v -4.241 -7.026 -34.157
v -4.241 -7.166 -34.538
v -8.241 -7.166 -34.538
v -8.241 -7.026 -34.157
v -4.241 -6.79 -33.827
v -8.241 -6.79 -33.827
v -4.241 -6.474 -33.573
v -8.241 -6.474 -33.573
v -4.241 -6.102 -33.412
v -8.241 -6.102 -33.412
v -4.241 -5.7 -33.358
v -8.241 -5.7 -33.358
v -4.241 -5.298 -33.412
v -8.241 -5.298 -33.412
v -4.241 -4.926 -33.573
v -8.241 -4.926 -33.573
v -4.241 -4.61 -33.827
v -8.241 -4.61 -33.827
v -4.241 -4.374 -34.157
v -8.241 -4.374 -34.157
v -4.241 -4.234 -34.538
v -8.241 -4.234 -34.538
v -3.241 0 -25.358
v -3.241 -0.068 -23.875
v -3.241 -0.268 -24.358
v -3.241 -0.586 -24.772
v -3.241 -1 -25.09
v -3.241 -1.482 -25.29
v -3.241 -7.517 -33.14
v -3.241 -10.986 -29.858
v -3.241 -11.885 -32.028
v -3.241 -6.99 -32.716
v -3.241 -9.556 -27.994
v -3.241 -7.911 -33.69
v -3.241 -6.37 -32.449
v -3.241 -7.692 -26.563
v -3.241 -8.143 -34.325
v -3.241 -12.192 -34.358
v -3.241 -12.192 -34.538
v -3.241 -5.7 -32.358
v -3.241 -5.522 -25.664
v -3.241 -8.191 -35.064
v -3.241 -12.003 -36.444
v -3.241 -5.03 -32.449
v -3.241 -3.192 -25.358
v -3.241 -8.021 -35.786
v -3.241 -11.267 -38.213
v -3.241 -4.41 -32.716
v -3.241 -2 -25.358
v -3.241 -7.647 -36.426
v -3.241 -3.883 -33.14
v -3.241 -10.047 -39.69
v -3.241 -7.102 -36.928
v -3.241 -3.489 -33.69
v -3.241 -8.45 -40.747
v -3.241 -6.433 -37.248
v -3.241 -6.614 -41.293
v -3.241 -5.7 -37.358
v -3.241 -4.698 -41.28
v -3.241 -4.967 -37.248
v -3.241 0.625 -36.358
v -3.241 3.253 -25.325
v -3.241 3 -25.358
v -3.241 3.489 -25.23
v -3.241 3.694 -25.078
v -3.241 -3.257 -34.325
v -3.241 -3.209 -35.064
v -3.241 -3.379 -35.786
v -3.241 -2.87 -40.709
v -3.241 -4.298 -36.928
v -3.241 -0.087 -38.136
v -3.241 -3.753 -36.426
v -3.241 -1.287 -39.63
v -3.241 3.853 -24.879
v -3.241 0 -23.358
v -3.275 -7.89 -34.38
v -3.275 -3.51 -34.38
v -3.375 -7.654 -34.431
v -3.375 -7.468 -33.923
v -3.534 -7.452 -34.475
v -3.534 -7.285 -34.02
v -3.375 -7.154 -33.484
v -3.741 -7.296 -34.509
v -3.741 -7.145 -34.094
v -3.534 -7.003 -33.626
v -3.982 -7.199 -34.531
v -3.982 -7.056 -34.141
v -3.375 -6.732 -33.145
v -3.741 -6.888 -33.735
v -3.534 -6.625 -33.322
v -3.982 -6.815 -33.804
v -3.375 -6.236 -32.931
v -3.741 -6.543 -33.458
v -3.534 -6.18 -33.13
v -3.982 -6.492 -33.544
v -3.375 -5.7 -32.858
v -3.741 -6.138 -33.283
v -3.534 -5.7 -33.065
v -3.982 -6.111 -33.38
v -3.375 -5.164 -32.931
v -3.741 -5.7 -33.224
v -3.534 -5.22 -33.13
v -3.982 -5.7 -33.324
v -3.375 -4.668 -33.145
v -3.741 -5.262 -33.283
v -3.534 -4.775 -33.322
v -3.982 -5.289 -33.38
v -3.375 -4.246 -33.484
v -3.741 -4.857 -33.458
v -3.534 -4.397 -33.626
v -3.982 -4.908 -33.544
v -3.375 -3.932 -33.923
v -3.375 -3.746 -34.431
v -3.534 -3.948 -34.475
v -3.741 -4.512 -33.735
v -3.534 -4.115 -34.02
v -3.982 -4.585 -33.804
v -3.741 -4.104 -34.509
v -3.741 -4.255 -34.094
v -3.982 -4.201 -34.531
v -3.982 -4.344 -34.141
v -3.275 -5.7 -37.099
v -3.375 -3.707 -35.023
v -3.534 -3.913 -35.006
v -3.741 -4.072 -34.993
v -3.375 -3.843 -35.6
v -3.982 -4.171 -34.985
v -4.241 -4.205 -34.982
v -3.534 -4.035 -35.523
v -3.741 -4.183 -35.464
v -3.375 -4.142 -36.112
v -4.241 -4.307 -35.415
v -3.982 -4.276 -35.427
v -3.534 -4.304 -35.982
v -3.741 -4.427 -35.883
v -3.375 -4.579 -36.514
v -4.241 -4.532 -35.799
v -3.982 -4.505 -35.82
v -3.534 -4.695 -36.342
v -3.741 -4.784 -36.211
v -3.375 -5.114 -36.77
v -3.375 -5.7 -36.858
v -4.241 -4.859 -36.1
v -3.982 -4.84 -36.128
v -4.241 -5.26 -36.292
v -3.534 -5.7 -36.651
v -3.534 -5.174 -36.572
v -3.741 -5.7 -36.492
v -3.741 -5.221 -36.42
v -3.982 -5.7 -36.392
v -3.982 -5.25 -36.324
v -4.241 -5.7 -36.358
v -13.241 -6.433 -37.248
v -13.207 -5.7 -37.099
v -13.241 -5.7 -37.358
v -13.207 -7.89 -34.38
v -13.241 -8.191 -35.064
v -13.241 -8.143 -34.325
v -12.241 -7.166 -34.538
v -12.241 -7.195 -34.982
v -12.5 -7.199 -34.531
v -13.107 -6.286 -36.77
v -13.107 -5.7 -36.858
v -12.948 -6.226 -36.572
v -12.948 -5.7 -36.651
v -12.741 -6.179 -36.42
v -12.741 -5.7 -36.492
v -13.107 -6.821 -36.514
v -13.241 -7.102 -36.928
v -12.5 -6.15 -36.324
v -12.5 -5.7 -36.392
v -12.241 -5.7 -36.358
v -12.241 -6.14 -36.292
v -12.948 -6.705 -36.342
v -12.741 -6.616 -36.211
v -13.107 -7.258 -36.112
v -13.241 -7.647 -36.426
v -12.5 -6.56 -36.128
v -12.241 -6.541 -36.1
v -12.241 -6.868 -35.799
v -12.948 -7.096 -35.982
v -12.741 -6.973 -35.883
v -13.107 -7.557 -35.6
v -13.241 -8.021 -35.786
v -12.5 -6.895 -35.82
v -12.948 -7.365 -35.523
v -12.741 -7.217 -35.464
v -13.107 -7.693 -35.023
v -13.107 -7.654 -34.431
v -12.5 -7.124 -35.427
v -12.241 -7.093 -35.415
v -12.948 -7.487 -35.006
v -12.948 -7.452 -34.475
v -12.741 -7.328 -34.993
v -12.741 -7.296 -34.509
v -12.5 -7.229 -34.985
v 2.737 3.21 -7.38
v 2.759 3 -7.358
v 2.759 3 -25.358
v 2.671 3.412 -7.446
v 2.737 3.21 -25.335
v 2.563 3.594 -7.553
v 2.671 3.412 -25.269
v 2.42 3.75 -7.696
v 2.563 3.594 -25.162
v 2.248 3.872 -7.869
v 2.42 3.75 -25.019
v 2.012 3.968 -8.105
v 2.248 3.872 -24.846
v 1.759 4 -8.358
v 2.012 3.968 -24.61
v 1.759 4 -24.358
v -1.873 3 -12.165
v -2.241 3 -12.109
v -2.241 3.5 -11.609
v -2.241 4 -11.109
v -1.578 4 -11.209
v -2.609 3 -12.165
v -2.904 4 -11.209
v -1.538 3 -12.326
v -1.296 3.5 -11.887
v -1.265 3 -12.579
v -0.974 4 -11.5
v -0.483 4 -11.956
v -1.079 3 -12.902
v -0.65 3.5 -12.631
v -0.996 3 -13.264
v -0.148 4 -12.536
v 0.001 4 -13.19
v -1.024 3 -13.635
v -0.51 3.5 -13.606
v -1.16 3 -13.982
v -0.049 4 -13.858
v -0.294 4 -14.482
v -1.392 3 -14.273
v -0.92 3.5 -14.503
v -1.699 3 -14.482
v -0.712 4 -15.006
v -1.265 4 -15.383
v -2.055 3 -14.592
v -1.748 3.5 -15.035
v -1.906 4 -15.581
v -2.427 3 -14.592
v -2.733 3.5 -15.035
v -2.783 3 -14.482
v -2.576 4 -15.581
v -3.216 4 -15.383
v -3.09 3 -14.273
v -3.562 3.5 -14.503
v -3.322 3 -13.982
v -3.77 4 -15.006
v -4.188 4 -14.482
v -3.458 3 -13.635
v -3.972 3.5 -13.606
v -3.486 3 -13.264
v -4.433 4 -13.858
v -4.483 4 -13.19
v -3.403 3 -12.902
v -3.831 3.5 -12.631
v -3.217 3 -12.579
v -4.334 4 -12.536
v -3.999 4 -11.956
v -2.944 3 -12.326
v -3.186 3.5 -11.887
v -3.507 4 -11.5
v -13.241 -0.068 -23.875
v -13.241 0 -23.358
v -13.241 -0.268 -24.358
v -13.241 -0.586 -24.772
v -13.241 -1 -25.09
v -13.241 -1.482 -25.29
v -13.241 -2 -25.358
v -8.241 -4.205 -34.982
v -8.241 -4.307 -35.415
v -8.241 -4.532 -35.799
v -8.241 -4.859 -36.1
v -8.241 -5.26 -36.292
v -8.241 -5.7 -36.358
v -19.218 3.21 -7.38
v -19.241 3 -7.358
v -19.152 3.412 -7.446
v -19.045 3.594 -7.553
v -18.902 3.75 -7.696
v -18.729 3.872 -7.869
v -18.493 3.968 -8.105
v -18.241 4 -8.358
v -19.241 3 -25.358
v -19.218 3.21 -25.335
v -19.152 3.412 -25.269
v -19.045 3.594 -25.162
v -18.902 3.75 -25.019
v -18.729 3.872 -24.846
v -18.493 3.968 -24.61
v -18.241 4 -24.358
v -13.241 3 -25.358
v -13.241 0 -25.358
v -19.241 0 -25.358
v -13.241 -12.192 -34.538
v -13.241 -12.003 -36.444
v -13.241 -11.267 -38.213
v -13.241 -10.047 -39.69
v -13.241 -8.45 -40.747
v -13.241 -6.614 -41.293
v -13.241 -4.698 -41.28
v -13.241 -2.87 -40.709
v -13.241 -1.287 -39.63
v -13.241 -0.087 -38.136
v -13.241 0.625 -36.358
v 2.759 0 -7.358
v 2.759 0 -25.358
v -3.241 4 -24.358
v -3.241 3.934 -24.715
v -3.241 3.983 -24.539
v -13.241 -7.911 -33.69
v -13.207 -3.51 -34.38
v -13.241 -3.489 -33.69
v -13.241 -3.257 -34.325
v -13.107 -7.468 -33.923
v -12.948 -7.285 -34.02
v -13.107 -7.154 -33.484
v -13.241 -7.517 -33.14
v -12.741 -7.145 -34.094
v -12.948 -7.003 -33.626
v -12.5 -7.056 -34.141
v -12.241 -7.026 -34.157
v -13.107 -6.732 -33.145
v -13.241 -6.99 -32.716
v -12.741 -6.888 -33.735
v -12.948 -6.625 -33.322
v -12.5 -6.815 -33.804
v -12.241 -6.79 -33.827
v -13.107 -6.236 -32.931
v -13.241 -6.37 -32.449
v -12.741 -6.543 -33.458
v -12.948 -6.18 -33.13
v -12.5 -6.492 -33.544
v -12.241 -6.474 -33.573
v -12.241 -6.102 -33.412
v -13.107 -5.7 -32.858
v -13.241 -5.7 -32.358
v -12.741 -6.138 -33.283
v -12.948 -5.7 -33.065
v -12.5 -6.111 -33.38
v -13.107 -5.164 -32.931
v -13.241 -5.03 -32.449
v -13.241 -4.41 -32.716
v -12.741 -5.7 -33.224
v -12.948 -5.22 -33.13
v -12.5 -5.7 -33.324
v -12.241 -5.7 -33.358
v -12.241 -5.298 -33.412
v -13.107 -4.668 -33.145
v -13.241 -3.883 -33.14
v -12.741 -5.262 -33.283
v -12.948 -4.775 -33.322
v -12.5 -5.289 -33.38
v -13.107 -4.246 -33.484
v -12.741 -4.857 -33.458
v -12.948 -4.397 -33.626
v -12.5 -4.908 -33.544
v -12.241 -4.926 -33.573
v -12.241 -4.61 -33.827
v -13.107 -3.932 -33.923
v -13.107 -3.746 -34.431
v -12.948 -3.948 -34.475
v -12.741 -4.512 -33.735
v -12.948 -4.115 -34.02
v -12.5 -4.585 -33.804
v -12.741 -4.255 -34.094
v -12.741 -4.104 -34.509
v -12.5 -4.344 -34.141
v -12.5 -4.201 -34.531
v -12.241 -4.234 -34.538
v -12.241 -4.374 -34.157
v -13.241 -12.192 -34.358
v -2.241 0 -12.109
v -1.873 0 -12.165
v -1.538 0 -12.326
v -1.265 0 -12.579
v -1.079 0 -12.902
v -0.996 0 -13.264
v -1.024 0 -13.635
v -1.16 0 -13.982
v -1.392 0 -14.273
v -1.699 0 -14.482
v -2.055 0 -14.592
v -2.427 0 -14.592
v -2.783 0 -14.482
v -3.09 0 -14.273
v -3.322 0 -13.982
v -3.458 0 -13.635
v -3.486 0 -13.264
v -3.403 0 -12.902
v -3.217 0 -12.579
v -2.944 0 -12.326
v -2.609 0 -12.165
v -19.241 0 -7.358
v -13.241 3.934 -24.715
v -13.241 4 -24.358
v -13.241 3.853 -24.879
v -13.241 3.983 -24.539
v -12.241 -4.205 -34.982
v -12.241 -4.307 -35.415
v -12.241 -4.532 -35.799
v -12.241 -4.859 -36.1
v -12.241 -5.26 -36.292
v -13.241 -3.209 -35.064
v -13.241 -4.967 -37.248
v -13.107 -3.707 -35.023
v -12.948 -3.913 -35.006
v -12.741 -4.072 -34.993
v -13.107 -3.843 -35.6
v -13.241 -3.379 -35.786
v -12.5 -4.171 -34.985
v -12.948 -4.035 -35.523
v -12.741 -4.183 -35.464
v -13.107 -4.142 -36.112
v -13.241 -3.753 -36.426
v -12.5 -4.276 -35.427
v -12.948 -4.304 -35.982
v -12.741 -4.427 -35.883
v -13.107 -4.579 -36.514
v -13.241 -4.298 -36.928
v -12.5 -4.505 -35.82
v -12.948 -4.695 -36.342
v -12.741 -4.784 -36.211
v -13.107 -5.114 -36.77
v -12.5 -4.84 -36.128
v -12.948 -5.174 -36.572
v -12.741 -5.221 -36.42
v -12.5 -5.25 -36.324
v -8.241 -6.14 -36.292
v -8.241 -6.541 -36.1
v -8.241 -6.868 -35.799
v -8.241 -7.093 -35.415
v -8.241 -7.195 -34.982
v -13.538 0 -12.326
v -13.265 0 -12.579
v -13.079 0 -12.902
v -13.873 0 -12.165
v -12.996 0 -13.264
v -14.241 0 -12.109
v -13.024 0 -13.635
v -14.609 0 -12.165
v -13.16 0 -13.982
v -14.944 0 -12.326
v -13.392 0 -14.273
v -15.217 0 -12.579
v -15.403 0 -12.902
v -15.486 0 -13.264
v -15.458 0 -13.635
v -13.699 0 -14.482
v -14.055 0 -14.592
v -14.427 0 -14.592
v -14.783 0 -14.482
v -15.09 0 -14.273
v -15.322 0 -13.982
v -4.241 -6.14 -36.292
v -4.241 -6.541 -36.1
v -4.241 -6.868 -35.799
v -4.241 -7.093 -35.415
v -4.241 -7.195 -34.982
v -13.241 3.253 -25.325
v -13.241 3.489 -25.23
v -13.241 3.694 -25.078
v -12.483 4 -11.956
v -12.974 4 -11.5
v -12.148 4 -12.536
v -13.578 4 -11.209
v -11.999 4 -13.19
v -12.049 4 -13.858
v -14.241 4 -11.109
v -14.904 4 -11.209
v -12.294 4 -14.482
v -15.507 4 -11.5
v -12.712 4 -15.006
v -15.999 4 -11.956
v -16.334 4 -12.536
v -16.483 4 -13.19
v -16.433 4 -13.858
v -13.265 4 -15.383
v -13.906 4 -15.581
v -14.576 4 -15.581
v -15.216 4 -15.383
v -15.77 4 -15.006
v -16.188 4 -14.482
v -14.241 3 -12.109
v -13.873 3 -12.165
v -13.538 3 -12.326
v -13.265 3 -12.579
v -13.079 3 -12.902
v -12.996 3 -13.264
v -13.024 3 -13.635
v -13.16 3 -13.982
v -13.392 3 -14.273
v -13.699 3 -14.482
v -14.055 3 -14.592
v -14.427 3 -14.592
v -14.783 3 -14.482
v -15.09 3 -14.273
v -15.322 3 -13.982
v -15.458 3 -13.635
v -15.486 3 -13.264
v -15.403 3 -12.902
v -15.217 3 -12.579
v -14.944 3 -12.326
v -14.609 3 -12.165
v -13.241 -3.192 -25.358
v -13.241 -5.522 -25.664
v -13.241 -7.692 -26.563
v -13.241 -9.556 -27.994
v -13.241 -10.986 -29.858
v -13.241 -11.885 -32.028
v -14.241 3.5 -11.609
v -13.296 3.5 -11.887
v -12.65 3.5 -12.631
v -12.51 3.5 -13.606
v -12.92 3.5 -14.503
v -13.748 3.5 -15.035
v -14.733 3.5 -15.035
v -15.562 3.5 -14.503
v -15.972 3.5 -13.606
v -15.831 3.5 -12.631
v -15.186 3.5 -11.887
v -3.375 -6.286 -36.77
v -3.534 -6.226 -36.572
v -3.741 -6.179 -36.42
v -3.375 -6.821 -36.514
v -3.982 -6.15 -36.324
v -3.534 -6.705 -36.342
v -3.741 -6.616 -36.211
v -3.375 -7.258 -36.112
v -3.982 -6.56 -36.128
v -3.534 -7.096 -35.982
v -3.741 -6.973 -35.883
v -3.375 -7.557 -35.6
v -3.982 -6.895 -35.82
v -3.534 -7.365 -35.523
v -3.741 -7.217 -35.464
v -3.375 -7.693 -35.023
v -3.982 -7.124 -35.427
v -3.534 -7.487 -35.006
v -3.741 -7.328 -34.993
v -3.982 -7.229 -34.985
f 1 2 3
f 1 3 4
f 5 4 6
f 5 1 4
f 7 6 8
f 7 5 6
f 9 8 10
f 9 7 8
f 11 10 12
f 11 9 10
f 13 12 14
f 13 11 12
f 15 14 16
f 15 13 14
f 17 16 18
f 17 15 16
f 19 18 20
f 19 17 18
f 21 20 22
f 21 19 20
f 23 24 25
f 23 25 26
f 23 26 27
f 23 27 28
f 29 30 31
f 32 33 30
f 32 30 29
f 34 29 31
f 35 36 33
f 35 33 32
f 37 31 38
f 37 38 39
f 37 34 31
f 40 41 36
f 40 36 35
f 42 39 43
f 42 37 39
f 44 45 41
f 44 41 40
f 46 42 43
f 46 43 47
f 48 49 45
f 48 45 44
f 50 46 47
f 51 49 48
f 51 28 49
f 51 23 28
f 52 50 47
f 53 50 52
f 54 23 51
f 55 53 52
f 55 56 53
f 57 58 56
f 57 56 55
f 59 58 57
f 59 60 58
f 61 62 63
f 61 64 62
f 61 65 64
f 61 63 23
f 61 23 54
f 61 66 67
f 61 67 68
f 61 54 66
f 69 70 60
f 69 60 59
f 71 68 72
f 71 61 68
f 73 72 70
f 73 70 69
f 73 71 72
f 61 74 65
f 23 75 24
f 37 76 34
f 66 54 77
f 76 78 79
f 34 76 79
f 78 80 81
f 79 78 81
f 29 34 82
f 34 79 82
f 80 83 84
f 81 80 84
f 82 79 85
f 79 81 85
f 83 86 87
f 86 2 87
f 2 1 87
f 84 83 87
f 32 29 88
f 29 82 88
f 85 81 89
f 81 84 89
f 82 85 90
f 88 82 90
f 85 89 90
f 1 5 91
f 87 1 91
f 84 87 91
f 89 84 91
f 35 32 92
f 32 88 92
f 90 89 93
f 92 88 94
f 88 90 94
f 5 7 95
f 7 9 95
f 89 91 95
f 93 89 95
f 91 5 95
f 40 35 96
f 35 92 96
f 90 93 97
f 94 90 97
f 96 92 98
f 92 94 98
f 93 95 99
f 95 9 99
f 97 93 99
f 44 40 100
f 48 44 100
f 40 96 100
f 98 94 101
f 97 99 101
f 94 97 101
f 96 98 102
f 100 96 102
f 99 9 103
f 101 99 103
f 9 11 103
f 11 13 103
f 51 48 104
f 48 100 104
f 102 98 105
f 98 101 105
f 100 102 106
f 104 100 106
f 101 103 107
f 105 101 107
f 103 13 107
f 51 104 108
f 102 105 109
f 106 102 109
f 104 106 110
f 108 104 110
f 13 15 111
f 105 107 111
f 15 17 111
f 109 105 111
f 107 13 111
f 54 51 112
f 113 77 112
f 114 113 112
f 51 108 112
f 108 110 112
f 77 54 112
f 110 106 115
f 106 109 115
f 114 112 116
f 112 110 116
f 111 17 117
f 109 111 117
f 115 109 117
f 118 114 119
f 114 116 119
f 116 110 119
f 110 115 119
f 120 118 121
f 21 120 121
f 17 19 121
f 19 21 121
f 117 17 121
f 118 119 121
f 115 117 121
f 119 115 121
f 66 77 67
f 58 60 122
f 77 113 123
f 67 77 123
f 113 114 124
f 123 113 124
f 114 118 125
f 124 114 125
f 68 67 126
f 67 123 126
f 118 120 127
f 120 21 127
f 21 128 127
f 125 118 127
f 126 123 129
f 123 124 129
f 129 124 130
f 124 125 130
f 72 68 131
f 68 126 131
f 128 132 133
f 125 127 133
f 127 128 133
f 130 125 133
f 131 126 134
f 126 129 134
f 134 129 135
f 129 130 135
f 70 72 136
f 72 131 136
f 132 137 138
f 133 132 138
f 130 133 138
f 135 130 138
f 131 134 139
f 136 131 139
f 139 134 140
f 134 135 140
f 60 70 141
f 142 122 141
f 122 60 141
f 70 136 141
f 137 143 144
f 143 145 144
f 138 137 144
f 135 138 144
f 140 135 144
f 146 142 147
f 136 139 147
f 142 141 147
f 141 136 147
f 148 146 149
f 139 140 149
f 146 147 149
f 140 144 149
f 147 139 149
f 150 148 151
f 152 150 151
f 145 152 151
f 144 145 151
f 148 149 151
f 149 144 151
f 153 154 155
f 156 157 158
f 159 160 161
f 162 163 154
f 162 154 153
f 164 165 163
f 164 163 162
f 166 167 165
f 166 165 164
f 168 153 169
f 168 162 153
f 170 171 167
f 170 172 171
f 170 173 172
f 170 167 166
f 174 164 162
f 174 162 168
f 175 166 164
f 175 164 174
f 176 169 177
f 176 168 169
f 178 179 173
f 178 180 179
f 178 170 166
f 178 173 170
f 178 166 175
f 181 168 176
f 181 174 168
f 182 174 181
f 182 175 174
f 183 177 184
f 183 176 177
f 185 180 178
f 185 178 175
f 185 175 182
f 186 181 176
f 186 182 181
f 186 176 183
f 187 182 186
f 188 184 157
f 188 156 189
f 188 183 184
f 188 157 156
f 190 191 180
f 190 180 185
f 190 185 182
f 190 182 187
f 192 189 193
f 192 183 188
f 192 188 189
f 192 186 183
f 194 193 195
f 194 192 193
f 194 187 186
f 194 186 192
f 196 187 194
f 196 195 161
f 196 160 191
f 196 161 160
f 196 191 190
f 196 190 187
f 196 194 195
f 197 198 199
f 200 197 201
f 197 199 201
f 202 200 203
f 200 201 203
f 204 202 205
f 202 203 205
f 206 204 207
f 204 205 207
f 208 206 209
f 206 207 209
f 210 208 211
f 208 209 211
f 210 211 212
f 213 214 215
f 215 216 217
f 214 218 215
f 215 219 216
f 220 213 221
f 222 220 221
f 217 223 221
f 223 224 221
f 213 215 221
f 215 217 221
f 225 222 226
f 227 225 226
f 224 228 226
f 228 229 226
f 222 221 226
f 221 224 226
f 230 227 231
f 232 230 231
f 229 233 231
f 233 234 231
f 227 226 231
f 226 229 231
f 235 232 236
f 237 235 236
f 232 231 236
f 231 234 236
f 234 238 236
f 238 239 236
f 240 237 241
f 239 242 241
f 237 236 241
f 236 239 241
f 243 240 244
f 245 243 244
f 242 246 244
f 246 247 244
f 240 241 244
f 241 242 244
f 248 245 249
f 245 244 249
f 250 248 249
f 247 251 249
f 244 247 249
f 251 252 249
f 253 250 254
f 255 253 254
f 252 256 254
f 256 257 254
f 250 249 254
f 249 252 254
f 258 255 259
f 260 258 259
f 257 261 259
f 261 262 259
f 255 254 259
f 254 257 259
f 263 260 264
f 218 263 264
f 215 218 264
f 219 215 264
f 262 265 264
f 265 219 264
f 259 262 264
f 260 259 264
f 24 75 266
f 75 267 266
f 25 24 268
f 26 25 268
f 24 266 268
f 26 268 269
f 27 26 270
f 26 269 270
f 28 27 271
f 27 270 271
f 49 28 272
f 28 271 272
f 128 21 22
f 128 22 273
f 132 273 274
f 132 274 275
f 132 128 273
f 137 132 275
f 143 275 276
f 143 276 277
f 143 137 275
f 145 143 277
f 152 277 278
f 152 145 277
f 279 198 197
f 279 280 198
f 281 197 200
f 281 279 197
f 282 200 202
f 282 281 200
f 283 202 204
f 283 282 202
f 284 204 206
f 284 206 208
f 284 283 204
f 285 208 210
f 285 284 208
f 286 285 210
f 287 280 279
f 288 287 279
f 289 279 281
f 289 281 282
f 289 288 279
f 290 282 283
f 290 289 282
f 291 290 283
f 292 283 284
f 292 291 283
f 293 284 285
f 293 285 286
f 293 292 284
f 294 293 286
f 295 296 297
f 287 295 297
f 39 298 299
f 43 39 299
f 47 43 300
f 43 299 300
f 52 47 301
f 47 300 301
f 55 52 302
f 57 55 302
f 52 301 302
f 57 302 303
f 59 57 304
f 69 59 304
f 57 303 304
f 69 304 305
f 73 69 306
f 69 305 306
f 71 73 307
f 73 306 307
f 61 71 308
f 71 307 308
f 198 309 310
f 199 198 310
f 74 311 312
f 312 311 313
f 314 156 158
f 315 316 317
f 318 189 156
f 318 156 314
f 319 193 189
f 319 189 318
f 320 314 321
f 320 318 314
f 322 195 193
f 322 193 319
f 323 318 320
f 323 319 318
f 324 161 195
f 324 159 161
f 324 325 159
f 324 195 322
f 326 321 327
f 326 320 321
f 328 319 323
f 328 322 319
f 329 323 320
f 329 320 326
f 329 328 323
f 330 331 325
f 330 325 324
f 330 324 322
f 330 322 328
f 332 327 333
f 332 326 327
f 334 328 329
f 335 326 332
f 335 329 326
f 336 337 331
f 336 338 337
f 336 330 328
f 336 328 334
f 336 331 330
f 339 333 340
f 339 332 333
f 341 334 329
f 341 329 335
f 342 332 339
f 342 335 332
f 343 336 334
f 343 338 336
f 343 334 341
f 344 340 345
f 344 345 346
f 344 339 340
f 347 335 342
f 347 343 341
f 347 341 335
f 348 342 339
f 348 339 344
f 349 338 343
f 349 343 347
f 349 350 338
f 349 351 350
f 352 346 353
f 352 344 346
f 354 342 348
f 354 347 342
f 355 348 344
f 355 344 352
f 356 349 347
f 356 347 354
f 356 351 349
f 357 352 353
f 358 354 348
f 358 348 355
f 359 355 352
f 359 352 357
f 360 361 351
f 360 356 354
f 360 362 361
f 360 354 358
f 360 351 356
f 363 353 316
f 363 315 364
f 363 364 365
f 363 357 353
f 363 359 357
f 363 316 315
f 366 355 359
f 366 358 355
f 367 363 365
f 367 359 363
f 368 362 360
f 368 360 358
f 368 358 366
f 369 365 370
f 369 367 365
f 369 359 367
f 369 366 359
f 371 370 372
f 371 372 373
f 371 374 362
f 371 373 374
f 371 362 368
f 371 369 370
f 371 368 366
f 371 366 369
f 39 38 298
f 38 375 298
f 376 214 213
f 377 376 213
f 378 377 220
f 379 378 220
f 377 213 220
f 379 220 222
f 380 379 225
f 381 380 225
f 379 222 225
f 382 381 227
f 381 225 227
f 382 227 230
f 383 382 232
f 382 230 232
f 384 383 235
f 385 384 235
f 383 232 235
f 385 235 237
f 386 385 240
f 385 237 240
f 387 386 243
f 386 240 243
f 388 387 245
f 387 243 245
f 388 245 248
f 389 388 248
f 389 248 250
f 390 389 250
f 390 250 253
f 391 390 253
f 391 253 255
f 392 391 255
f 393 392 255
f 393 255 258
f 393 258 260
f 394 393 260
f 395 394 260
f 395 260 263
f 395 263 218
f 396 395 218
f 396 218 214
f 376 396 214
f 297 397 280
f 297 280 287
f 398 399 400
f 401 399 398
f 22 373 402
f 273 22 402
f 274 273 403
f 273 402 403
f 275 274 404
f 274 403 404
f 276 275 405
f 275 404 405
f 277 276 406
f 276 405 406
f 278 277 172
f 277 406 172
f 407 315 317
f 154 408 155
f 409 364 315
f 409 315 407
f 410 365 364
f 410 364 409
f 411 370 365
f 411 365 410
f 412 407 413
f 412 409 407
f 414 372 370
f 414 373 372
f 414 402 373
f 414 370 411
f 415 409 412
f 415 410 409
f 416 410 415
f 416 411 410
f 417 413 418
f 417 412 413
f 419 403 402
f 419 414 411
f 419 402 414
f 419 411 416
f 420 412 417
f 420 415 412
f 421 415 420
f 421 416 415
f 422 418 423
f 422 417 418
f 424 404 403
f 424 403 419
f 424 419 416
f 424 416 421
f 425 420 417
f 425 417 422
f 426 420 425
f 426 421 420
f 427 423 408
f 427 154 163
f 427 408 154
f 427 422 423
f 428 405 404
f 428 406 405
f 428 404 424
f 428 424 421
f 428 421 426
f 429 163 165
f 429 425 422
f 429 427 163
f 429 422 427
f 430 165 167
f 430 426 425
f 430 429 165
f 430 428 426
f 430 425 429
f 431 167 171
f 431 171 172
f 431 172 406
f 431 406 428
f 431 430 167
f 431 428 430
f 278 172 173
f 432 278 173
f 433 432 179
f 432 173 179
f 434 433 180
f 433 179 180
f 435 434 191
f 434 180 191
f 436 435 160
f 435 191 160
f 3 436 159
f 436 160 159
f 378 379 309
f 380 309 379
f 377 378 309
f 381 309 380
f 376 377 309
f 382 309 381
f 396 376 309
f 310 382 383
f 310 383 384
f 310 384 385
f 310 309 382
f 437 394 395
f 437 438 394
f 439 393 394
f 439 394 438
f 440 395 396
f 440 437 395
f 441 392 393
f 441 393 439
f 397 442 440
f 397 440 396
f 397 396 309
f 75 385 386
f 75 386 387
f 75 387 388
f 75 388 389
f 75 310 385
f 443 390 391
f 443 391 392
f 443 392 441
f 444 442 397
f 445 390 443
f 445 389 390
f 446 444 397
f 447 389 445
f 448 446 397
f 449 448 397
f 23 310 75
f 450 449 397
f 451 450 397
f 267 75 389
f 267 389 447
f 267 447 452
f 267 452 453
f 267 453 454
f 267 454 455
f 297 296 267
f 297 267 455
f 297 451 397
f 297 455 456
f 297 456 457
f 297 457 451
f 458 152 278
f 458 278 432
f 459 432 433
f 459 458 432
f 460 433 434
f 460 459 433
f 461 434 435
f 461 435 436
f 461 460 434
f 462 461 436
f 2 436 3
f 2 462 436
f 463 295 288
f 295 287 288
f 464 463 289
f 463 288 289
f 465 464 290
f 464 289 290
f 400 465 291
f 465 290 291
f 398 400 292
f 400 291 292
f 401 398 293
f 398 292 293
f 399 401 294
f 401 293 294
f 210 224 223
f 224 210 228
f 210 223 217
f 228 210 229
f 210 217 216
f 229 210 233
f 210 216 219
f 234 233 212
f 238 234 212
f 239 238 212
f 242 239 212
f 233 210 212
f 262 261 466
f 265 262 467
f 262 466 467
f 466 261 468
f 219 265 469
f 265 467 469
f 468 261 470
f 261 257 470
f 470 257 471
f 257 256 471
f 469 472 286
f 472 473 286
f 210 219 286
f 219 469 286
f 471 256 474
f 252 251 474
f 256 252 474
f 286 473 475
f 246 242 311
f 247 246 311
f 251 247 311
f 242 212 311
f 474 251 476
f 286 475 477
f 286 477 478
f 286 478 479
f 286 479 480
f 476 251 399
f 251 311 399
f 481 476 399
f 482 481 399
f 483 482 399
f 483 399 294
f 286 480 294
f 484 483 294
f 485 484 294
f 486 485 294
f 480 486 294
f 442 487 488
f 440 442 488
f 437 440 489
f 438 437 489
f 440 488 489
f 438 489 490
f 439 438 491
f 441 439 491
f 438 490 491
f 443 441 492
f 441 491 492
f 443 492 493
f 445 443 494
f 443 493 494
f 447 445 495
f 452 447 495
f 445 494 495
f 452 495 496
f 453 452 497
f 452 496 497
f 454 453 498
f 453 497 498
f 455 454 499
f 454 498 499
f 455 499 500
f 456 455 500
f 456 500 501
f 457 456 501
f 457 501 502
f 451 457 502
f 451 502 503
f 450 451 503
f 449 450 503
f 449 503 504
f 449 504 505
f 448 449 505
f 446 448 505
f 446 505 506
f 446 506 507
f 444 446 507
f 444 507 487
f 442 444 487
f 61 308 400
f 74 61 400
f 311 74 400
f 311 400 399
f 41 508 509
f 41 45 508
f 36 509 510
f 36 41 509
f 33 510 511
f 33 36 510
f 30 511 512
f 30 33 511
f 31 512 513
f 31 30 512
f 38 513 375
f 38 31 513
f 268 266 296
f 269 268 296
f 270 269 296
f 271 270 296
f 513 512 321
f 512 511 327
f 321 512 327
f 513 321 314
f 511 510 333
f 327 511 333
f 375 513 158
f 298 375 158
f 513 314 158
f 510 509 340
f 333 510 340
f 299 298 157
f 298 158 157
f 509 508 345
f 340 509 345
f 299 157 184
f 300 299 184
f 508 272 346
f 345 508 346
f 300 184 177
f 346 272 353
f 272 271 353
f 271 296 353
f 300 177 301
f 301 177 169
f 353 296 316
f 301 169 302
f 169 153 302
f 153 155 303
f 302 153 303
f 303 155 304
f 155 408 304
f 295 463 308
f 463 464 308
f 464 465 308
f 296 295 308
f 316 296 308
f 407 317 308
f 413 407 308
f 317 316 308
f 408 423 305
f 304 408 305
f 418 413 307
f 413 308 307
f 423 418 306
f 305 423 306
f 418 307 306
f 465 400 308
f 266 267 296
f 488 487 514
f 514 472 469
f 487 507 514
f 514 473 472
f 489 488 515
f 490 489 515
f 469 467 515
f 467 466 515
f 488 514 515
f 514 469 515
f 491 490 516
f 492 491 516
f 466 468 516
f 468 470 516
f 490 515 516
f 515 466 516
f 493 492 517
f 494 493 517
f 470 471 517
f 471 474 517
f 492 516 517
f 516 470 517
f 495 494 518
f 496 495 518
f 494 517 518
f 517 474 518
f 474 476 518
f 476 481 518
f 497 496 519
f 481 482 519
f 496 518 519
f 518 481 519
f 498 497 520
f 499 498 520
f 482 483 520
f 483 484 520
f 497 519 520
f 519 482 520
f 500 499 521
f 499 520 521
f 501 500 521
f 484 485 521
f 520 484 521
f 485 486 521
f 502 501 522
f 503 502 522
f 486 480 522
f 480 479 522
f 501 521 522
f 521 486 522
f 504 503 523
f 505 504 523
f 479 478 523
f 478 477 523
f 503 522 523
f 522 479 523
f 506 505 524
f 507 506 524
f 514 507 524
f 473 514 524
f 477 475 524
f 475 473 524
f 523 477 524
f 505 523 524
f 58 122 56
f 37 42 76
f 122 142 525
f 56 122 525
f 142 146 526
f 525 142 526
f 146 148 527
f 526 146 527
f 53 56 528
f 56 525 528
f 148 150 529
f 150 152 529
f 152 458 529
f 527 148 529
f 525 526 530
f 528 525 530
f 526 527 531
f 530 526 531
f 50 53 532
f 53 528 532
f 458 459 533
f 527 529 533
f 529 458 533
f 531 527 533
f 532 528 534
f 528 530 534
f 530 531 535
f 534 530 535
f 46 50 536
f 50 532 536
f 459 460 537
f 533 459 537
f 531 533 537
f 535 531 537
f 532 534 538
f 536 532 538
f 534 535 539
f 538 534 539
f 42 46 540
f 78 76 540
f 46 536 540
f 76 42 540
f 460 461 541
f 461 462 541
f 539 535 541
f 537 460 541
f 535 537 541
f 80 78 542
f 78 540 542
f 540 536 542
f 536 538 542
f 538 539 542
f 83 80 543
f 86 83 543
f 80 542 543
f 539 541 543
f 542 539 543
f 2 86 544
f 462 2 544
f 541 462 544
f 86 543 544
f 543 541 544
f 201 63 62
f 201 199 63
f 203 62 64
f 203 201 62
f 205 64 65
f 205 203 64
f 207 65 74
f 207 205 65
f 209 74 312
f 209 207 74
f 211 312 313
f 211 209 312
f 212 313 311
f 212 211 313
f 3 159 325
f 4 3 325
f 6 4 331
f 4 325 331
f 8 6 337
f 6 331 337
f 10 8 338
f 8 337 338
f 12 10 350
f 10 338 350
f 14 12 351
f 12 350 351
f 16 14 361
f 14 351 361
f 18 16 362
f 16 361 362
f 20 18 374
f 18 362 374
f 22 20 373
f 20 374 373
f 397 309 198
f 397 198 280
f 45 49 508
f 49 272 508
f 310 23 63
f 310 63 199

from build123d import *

# Parameters (mm, degrees)
SKETCH1_W           = 11
SKETCH1_H           = 18
SKETCH1_W_2         = 5
SKETCH1_H_2         = 11
BOSS_EXTRUDE1_DEPTH = 4
BOSS_EXTRUDE2_DEPTH = 5
SKETCH3_R           = 1.248430758
CUT_EXTRUDE1_DEPTH  = 5
FILLET1_R           = 1
FILLET3_R           = 2
FILLET4_R           = 9
CUT_EXTRUDE2_DEPTH  = 10
CHAMFER1_SIZE       = 1


with BuildPart() as part:
    # Sketch1 → Boss-Extrude1 (new body)
    with BuildSketch(Plane(origin=(0, 0, 0), x_dir=(1, 0, 0), z_dir=(0, 1, 0))):
        with Locations((-2.740875912, 16.357664234)):
            Rectangle(SKETCH1_W, SKETCH1_H)
        with Locations((-5.740875912, 30.857664234)):
            Rectangle(SKETCH1_W_2, SKETCH1_H_2)
    boss_extrude1 = extrude(amount=BOSS_EXTRUDE1_DEPTH)

    # Sketch2 → Boss-Extrude2 (add)
    with BuildSketch(Plane(origin=(-3.240875912, 0, 0), x_dir=(0, 0, -1), z_dir=(1, 0, 0))):
        with BuildLine():
            Line((34.537911903, 0), (25.357664234, 0))
            Line((25.357664234, 0), (25.357664234, -12.192130501))
            Line((25.357664234, -12.192130501), (34.537911903, -12.192130501))
            Line((34.537911903, -12.192130501), (34.537911903, -7.165523267))
            ThreePointArc((34.537911903, -7.165523267), (33.357664234, -5.7), (34.537911903, -4.234476733))
            Line((34.537911903, -4.234476733), (34.537911903, 0))
        make_face()
        with BuildLine():
            Line((36.357664234, 0), (34.537911903, 0))
            Line((34.537911903, 0), (34.537911903, -4.234476733))
            ThreePointArc((34.537911903, -4.234476733), (35.798507341, -4.531747353), (36.357664234, -5.7))
            ThreePointArc((36.357664234, -5.7), (35.798507341, -6.868252647), (34.537911903, -7.165523267))
            Line((34.537911903, -7.165523267), (34.537911903, -12.192130501))
            ThreePointArc((34.537911903, -12.192130501), (41.293121094, -6.613725887), (36.357664234, 0.62455532))
            Line((36.357664234, 0.62455532), (36.357664234, 0))
        make_face()
    boss_extrude2 = extrude(amount=-BOSS_EXTRUDE2_DEPTH)

    # Mirror1: Boss-Extrude1, Boss-Extrude2 across plane
    add(boss_extrude1.mirror(Plane(origin=(-8.240875912, 4, 0), x_dir=(0, 0, 1), z_dir=(1, 0, 0))))
    add(boss_extrude2.mirror(Plane(origin=(-8.240875912, 4, 0), x_dir=(0, 0, 1), z_dir=(1, 0, 0))))

    # Sketch3 → Cut-Extrude1 (cut)
    with BuildSketch(Plane(origin=(0, 4, 0), x_dir=(1, 0, 0), z_dir=(0, 1, 0))):
        with Locations(Location((-2.240875912, 13.357664234, 0), (0, 0, 270))):
            Circle(SKETCH3_R)
        with Locations(Location((-14.240875912, 13.357664234, 0), (0, 0, 270))):
            Circle(SKETCH3_R)
    extrude(amount=-CUT_EXTRUDE1_DEPTH, mode=Mode.SUBTRACT)

    # Fillet1
    fillet1_edges = [part.edges().sort_by_distance(p)[0] for p in [
        (-0.240875912, 4, -25.357664234),
        (-3.240875912, -4.234476733, -35.177416564),
        (-8.240875912, 4, -7.357664234),
        (-19.240875912, 4, -16.357664234),
        (-16.240875912, 4, -25.357664234),
        (2.759124088, 4, -16.357664234),
        (-13.240875912, -4.234476733, -35.177416564),
    ]]
    fillet(fillet1_edges, radius=FILLET1_R)

    # Fillet3
    fillet3_edges = [part.edges().sort_by_distance(p)[0] for p in [
        (-8.240875912, 0, -25.357664234),
    ]]
    fillet(fillet3_edges, radius=FILLET3_R)

    # Fillet4
    fillet4_edges = [part.edges().sort_by_distance(p)[0] for p in [
        (-8.240875912, -12.192130501, -25.357664234),
    ]]
    fillet(fillet4_edges, radius=FILLET4_R)

    # Sketch4 → Cut-Extrude2 (cut)
    with BuildSketch(Plane.ZY.offset(13.240875912)):
        Polygon((-36.357664234, 0.62455532), (-24.357664234, 4), (-36.357664234, 4), align=None)
    extrude(amount=-CUT_EXTRUDE2_DEPTH, mode=Mode.SUBTRACT)

    # Chamfer1
    chamfer1_edges = [part.edges().sort_by_distance(p)[0] for p in [
        (-2.240875912, 4, -14.606094992),
        (-14.240875912, 4, -14.606094992),
    ]]
    chamfer(chamfer1_edges, length=CHAMFER1_SIZE)


solid = part.part
